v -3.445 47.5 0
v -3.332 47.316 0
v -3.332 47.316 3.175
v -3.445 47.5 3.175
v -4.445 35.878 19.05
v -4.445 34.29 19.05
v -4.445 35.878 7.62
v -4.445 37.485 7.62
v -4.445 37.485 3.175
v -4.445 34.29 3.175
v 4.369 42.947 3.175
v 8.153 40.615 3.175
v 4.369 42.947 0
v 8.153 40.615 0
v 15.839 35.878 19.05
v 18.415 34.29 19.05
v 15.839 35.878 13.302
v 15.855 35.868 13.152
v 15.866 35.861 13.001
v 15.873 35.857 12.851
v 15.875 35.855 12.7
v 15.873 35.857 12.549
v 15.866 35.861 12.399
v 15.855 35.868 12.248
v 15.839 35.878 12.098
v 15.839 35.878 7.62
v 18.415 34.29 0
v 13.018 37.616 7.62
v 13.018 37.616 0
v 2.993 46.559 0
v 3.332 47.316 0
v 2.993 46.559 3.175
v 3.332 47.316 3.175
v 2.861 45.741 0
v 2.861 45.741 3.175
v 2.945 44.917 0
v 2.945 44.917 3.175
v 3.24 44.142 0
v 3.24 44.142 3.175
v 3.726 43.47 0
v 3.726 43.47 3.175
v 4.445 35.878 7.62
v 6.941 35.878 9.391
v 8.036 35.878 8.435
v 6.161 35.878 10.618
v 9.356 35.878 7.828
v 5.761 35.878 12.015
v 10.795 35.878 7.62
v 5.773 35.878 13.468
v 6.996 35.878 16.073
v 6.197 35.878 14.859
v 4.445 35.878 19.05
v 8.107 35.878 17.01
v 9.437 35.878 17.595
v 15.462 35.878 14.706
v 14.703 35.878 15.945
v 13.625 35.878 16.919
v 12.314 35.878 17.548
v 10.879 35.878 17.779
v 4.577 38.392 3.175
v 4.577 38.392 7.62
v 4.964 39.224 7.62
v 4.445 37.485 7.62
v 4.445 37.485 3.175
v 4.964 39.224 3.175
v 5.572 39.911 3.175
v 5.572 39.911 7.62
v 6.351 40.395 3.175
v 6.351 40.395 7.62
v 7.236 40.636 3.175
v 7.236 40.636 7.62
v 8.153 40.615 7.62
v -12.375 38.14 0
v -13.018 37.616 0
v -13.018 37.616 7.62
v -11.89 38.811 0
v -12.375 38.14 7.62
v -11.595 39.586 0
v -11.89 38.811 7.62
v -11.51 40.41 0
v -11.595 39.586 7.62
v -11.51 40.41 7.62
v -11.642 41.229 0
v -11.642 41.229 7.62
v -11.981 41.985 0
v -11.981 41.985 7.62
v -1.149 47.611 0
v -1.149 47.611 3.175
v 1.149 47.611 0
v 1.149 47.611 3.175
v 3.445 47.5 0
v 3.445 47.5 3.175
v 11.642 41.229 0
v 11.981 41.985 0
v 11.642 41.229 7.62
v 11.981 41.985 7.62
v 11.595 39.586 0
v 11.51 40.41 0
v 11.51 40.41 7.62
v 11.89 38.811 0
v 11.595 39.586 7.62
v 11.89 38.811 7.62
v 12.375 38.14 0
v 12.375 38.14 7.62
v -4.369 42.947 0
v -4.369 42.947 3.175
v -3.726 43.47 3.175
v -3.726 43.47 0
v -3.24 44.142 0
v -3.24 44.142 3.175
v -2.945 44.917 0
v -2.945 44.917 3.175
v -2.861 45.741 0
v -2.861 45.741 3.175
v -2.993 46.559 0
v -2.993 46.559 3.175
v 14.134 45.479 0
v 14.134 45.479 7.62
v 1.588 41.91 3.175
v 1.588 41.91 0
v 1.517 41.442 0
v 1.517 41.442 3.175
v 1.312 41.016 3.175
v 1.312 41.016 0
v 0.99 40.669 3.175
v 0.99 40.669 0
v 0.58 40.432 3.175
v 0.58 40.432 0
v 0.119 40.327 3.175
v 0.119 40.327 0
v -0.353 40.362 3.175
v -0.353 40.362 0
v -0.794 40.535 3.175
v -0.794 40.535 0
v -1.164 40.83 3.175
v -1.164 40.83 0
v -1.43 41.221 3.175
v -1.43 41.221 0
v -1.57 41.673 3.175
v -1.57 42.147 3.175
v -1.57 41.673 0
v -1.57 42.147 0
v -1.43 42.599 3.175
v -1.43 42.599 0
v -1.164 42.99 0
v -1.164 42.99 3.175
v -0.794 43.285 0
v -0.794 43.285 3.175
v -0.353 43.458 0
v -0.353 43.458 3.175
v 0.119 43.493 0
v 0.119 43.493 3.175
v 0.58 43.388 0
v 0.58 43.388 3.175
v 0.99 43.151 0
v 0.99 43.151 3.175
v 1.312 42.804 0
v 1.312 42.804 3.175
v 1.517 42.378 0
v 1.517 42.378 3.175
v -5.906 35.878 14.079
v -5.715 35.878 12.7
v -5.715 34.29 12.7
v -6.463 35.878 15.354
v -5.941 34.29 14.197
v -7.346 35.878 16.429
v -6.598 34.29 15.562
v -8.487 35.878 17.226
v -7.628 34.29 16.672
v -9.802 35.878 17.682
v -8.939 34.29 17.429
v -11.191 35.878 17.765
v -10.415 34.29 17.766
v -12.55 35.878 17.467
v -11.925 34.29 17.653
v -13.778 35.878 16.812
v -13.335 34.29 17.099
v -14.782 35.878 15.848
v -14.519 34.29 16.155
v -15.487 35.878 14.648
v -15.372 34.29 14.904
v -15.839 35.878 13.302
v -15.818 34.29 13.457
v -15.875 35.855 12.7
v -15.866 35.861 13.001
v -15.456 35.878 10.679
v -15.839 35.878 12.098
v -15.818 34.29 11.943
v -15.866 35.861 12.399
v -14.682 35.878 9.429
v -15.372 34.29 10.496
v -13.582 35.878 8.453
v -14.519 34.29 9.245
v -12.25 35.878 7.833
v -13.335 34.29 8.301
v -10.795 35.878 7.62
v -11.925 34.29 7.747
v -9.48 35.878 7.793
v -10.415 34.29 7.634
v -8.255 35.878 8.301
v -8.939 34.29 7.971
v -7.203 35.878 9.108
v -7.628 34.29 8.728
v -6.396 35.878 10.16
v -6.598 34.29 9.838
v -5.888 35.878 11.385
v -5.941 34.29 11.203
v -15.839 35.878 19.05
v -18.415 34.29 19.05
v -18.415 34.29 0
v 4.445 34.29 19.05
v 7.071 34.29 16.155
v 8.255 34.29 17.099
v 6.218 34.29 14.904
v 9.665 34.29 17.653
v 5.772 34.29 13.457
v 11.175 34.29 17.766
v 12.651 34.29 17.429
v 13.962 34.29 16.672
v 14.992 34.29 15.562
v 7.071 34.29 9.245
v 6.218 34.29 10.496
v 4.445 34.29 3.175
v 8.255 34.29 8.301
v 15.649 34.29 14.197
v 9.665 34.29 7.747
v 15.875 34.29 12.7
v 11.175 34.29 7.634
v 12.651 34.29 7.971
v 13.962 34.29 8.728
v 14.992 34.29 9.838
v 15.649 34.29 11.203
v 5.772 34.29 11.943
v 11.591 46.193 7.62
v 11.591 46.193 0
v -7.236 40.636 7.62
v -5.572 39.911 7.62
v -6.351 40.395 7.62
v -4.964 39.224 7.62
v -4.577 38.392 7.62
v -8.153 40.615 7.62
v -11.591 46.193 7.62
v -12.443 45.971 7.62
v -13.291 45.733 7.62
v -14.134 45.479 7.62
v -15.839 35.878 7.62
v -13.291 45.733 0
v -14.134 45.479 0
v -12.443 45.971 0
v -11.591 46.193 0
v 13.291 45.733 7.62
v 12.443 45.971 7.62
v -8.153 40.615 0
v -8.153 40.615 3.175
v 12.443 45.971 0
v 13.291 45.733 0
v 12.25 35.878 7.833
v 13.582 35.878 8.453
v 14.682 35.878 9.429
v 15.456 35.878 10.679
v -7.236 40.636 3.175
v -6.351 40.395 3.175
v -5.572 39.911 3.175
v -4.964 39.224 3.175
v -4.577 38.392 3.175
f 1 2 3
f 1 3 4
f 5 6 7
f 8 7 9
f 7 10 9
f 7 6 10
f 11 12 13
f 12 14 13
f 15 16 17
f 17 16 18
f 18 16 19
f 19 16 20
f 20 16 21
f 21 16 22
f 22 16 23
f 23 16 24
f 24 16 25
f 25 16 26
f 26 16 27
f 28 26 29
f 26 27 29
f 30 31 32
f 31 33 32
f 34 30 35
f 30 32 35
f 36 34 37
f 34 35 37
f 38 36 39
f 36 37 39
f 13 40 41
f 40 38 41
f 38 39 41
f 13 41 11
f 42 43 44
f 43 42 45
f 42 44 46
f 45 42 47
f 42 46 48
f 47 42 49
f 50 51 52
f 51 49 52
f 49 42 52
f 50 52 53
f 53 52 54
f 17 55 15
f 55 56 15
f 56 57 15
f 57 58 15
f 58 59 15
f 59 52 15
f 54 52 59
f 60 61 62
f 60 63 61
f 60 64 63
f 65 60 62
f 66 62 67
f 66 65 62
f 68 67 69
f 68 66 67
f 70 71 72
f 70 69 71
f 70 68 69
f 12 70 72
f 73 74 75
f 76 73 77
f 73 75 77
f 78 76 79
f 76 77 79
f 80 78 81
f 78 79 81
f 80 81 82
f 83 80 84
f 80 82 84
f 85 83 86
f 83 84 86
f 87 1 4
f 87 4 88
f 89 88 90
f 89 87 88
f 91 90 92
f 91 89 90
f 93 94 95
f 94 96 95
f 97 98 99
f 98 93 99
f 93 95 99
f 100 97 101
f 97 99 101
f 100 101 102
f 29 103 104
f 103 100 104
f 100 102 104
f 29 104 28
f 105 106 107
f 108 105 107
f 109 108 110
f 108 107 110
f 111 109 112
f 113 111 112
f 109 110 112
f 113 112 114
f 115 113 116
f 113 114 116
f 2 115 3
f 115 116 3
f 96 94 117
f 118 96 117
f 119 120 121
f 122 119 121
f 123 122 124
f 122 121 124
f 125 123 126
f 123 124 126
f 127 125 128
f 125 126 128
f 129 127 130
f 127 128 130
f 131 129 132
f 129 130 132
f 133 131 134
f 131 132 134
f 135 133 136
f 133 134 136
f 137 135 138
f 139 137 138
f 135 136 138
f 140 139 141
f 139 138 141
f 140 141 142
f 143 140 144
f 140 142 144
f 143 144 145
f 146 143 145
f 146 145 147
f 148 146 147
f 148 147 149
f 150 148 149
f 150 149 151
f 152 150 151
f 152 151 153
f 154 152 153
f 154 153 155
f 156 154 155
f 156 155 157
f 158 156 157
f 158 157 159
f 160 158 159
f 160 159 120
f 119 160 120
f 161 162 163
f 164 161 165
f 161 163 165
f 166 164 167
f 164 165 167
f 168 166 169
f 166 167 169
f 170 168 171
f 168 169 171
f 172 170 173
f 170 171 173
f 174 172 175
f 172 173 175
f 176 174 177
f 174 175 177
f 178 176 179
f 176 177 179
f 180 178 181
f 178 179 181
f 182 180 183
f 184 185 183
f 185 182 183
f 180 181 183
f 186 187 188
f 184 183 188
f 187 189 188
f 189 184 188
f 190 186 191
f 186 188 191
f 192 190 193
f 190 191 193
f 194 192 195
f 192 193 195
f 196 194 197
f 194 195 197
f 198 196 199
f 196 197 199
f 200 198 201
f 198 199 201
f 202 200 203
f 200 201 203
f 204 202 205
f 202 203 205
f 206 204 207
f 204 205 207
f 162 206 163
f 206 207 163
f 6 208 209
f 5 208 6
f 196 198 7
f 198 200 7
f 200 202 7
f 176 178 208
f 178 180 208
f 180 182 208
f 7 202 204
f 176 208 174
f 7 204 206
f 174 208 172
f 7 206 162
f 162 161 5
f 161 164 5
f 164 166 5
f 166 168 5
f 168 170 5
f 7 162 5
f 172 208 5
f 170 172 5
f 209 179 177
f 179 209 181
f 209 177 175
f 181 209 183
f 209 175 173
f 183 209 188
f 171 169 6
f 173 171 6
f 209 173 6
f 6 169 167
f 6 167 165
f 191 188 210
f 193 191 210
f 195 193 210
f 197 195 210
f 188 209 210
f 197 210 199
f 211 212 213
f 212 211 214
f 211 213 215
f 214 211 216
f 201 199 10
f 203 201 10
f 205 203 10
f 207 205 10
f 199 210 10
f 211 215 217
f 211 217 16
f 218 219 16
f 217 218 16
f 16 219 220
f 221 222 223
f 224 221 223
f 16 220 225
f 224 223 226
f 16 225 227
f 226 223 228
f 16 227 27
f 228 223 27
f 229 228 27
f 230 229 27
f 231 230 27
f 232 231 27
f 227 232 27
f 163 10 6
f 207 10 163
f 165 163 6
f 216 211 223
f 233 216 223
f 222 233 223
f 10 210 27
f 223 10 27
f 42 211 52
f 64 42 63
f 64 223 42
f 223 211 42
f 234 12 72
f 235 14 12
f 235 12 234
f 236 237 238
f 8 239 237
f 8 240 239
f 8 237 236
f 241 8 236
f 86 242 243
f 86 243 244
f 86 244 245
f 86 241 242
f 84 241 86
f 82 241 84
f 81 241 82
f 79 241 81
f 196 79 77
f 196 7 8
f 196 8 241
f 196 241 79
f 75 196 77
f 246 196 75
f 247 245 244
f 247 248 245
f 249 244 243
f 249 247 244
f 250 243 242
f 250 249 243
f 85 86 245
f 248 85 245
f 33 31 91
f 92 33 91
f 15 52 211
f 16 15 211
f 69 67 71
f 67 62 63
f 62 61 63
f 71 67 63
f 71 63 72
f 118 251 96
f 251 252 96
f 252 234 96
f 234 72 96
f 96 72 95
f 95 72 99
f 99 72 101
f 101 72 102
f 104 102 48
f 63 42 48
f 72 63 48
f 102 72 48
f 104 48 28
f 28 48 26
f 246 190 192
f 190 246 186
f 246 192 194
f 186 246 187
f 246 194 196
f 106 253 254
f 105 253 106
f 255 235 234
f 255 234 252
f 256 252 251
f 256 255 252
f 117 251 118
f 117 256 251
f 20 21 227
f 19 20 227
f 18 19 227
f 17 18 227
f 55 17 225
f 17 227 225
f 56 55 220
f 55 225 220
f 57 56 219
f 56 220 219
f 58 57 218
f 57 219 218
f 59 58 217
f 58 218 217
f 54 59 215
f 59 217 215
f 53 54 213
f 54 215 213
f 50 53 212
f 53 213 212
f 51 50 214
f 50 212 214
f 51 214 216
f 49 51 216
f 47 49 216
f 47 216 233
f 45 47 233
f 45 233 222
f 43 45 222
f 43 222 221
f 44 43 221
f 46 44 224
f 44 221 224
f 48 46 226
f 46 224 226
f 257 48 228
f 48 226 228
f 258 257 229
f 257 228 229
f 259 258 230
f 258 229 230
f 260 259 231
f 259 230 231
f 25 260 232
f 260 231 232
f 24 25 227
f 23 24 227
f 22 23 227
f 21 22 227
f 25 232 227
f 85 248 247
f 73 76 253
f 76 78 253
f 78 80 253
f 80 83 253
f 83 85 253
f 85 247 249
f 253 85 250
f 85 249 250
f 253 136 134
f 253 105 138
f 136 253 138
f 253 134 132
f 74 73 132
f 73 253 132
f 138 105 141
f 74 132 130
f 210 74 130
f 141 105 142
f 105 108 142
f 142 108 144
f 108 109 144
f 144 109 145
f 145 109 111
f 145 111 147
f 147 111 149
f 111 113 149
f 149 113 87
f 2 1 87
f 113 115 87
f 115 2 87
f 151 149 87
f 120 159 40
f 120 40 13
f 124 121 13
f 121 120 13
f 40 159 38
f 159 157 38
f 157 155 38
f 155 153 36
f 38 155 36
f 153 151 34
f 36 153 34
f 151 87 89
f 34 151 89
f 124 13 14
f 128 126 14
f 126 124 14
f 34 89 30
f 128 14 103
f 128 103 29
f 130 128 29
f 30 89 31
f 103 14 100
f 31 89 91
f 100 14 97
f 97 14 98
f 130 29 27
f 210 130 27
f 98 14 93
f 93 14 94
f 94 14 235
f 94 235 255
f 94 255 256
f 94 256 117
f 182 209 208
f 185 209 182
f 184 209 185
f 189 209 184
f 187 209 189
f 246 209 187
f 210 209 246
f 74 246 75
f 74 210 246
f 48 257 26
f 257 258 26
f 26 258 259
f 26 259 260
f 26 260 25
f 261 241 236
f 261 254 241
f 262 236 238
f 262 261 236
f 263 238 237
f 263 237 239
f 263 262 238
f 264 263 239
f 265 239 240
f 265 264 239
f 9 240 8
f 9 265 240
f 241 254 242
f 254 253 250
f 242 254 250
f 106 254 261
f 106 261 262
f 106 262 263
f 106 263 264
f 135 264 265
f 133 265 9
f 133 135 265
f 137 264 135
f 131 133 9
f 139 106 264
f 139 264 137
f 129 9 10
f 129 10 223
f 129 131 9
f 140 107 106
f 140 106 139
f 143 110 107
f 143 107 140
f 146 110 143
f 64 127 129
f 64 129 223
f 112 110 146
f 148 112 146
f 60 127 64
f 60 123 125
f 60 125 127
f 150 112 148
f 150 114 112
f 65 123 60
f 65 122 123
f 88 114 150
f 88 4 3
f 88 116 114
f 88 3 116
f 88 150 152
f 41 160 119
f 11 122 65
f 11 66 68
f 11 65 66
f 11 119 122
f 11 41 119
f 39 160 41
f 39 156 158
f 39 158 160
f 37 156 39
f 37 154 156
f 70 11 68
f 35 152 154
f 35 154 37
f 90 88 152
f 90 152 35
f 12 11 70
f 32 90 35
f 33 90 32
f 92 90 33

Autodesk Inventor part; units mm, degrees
ref_plane "YZ Plane" through (0, 0, 0) normal (1, 0, 0) x (0, 1, 0)
ref_plane "XZ Plane" through (0, 0, 0) normal (0, 1, 0) x (-1, 0, 0)
sketch "Sketch1" plane through (0, 0, 0) normal (0, 0, 1) x (1, 0, 0)
  circle A0 centre (0, 0) radius 47.625
  line L0 (0, 0) -> (0, 41.91)
  circle A1 centre (0, 41.91) radius 1.5875
  line L1 (-10.795, 34.29) -> (10.795, 34.29)
  circle A2 centre (0, 41.91) radius 3.175
  line L2 (-10.795, 34.29) -> (-18.415, 34.29)
  line L3 (10.795, 34.29) -> (18.415, 34.29)
  line L4 (18.415, 34.29) -> (1.6658, 44.6129)
  line L5 (-18.415, 34.29) -> (-1.6658, 44.6129)
  line L6 (-1.6658, 44.6129) -> (-3.4454, 47.5002)
  line L7 (1.6658, 44.6129) -> (3.4454, 47.5002)
  line L8 (8.1528, 40.6148) -> (11.5907, 46.193)
  line L9 (10.3151, 39.2822) -> (14.1344, 45.4792)
  line L10 (-8.1528, 40.6148) -> (-11.5907, 46.193)
  line L11 (-10.3151, 39.2822) -> (-14.1344, 45.4792)
  dimension "d0" = 95.25
  dimension "d1" = 41.91
  dimension "d2" = 3.175
  dimension "d3" = 21.59
  dimension "d4" = 7.62
  dimension "d5" = 10.795
  dimension "d6" = 6.35
  dimension "d7" = 7.62
  dimension "d8" = 7.62
  dimension "d27" = 7.62
  dimension "d28" = 2.54
  dimension "d29" = 7.62
  dimension "d30" = 2.54
extrude "Extrusion1" add sketch "Sketch1" along normal blind 3.175 contours L4 L3 L1 L0 A2 | L5 A2 L0 L1 L2 | L7 A2 L6 A0 | A2
sketch "Sketch2" plane through (0, 0, 3.175) normal (0, 0, 1) x (1, 0, 0)
  circle A0 centre (0, 41.91) radius 1.5875 projected
  line L0 (-1.6658, 44.6129) -> (-18.415, 34.29) projected
  line L1 (-18.415, 34.29) -> (18.415, 34.29) projected
  line L2 (18.415, 34.29) -> (1.6658, 44.6129) projected
  line L3 (1.6658, 44.6129) -> (3.4454, 47.5002) projected
  arc A1 (3.4454, 47.5002) -> (-3.4454, 47.5002) centre (0, 0) ccw projected
  line L4 (-3.4454, 47.5002) -> (-1.6658, 44.6129) projected
  line L5 (-4.445, 34.29) -> (-4.445, 42.9)
  line L6 (-18.415, 34.29) -> (18.415, 34.29) projected
  line L7 (4.445, 34.29) -> (4.445, 42.9)
  dimension "d11" = 13.97
extrude "Extrusion2" add sketch "Sketch2" along normal blind 15.875 contours L5 L1 L0 | L7 L2 L1
sketch "Sketch3" plane through (-18.415, 34.29, 0) normal (0, -1, 0) x (1, 0, 0)
  line L0 (0, 0) -> (36.83, 0) projected
  line L1 (36.83, 0) -> (36.83, 19.05) projected
  line L2 (22.86, 19.05) -> (36.83, 19.05) projected
  line L3 (22.86, 3.175) -> (22.86, 19.05) projected
  line L4 (13.97, 3.175) -> (22.86, 3.175) projected
  line L5 (13.97, 3.175) -> (13.97, 19.05) projected
  line L6 (0, 19.05) -> (13.97, 19.05) projected
  line L7 (0, 0) -> (0, 19.05) projected
  circle A0 centre (7.62, 12.7) radius 5.08
  circle A1 centre (29.21, 12.7) radius 5.08
  point P0 (18.415, 0)
  dimension "d14" = 10.16
  dimension "d15" = 10.16
  dimension "d16" = 6.35
  dimension "d17" = 6.35
  dimension "d18" = 6.35
  dimension "d19" = 6.35
extrude "Extrusion3" cut sketch "Sketch3" against normal blind 12.7 contours A0 | A1
ref_plane "Work Plane1" through (-18.415, 35.8775, 0) normal (0, -1, 0) x (1, 0, 0)
sketch "Sketch4" plane through (-18.415, 35.8775, 0) normal (0, -1, 0) x (1, 0, 0)
  circle A0 centre (29.21, 12.7) radius 5.08 projected
  line L0 (36.83, 0) -> (20.0808, 0) projected
  line L1 (20.0808, 0) -> (20.0808, 3.175) projected
  line L2 (22.86, 3.175) -> (20.0808, 3.175) projected
  line L3 (22.86, 3.175) -> (22.86, 19.05) projected
  line L4 (36.83, 19.05) -> (22.86, 19.05) projected
  line L5 (36.83, 0) -> (36.83, 19.05) projected
  circle A1 centre (7.62, 12.7) radius 5.08 projected
  line L6 (16.7492, 0) -> (0, 0) projected
  line L7 (0, 0) -> (0, 19.05) projected
  line L8 (13.97, 19.05) -> (0, 19.05) projected
  line L9 (13.97, 3.175) -> (13.97, 19.05) projected
  line L10 (16.7492, 3.175) -> (13.97, 3.175) projected
  line L11 (16.7492, 0) -> (16.7492, 3.175) projected
  line L12 (36.83, 19.05) -> (22.86, 19.05) projected
  line L13 (36.83, 19.05) -> (22.86, 19.05)
  line L14 (22.86, 19.05) -> (22.86, 7.62)
  line L15 (22.86, 7.62) -> (36.83, 7.62)
  line L16 (36.83, 7.62) -> (36.83, 19.05)
  line L17 (0, 19.05) -> (13.97, 19.05)
  line L18 (13.97, 19.05) -> (13.97, 7.62)
  line L19 (13.97, 7.62) -> (0, 7.62)
  line L20 (0, 7.62) -> (0, 19.05)
  circle A2 centre (29.21, 12.7) radius 5.08 projected
  circle A3 centre (7.62, 12.7) radius 5.08 projected
  point P0 (18.415, 0)
extrude "Extrusion4" cut sketch "Sketch4" against normal blind 12.7 contours A0 | L15 L3 L4 L5 | A1 | L19 L7 L8 L9
fillet "Fillet1" radius 3.175 2 edges at (1.6658, 44.6129, 1.5875) (-1.6658, 44.6129, 1.5875)
extrude "Extrusion5" add sketch "Sketch1" along normal up to surface (7.62 mm away) contours L9 L4 L8 A0 | A0 L10 L5 L11
fillet "Fillet3" radius 3.175 2 edges at (-10.3151, 39.2822, 3.81) (10.3151, 39.2822, 3.81)
fillet "Fillet4" radius 3.175 2 edges at (-4.445, 42.9, 5.3975) (4.445, 42.9, 5.3975)
equation "\"d5\" = 0.5 * d3"
properties part number "aftPotentiometerMount" material "ABS Plastic"
